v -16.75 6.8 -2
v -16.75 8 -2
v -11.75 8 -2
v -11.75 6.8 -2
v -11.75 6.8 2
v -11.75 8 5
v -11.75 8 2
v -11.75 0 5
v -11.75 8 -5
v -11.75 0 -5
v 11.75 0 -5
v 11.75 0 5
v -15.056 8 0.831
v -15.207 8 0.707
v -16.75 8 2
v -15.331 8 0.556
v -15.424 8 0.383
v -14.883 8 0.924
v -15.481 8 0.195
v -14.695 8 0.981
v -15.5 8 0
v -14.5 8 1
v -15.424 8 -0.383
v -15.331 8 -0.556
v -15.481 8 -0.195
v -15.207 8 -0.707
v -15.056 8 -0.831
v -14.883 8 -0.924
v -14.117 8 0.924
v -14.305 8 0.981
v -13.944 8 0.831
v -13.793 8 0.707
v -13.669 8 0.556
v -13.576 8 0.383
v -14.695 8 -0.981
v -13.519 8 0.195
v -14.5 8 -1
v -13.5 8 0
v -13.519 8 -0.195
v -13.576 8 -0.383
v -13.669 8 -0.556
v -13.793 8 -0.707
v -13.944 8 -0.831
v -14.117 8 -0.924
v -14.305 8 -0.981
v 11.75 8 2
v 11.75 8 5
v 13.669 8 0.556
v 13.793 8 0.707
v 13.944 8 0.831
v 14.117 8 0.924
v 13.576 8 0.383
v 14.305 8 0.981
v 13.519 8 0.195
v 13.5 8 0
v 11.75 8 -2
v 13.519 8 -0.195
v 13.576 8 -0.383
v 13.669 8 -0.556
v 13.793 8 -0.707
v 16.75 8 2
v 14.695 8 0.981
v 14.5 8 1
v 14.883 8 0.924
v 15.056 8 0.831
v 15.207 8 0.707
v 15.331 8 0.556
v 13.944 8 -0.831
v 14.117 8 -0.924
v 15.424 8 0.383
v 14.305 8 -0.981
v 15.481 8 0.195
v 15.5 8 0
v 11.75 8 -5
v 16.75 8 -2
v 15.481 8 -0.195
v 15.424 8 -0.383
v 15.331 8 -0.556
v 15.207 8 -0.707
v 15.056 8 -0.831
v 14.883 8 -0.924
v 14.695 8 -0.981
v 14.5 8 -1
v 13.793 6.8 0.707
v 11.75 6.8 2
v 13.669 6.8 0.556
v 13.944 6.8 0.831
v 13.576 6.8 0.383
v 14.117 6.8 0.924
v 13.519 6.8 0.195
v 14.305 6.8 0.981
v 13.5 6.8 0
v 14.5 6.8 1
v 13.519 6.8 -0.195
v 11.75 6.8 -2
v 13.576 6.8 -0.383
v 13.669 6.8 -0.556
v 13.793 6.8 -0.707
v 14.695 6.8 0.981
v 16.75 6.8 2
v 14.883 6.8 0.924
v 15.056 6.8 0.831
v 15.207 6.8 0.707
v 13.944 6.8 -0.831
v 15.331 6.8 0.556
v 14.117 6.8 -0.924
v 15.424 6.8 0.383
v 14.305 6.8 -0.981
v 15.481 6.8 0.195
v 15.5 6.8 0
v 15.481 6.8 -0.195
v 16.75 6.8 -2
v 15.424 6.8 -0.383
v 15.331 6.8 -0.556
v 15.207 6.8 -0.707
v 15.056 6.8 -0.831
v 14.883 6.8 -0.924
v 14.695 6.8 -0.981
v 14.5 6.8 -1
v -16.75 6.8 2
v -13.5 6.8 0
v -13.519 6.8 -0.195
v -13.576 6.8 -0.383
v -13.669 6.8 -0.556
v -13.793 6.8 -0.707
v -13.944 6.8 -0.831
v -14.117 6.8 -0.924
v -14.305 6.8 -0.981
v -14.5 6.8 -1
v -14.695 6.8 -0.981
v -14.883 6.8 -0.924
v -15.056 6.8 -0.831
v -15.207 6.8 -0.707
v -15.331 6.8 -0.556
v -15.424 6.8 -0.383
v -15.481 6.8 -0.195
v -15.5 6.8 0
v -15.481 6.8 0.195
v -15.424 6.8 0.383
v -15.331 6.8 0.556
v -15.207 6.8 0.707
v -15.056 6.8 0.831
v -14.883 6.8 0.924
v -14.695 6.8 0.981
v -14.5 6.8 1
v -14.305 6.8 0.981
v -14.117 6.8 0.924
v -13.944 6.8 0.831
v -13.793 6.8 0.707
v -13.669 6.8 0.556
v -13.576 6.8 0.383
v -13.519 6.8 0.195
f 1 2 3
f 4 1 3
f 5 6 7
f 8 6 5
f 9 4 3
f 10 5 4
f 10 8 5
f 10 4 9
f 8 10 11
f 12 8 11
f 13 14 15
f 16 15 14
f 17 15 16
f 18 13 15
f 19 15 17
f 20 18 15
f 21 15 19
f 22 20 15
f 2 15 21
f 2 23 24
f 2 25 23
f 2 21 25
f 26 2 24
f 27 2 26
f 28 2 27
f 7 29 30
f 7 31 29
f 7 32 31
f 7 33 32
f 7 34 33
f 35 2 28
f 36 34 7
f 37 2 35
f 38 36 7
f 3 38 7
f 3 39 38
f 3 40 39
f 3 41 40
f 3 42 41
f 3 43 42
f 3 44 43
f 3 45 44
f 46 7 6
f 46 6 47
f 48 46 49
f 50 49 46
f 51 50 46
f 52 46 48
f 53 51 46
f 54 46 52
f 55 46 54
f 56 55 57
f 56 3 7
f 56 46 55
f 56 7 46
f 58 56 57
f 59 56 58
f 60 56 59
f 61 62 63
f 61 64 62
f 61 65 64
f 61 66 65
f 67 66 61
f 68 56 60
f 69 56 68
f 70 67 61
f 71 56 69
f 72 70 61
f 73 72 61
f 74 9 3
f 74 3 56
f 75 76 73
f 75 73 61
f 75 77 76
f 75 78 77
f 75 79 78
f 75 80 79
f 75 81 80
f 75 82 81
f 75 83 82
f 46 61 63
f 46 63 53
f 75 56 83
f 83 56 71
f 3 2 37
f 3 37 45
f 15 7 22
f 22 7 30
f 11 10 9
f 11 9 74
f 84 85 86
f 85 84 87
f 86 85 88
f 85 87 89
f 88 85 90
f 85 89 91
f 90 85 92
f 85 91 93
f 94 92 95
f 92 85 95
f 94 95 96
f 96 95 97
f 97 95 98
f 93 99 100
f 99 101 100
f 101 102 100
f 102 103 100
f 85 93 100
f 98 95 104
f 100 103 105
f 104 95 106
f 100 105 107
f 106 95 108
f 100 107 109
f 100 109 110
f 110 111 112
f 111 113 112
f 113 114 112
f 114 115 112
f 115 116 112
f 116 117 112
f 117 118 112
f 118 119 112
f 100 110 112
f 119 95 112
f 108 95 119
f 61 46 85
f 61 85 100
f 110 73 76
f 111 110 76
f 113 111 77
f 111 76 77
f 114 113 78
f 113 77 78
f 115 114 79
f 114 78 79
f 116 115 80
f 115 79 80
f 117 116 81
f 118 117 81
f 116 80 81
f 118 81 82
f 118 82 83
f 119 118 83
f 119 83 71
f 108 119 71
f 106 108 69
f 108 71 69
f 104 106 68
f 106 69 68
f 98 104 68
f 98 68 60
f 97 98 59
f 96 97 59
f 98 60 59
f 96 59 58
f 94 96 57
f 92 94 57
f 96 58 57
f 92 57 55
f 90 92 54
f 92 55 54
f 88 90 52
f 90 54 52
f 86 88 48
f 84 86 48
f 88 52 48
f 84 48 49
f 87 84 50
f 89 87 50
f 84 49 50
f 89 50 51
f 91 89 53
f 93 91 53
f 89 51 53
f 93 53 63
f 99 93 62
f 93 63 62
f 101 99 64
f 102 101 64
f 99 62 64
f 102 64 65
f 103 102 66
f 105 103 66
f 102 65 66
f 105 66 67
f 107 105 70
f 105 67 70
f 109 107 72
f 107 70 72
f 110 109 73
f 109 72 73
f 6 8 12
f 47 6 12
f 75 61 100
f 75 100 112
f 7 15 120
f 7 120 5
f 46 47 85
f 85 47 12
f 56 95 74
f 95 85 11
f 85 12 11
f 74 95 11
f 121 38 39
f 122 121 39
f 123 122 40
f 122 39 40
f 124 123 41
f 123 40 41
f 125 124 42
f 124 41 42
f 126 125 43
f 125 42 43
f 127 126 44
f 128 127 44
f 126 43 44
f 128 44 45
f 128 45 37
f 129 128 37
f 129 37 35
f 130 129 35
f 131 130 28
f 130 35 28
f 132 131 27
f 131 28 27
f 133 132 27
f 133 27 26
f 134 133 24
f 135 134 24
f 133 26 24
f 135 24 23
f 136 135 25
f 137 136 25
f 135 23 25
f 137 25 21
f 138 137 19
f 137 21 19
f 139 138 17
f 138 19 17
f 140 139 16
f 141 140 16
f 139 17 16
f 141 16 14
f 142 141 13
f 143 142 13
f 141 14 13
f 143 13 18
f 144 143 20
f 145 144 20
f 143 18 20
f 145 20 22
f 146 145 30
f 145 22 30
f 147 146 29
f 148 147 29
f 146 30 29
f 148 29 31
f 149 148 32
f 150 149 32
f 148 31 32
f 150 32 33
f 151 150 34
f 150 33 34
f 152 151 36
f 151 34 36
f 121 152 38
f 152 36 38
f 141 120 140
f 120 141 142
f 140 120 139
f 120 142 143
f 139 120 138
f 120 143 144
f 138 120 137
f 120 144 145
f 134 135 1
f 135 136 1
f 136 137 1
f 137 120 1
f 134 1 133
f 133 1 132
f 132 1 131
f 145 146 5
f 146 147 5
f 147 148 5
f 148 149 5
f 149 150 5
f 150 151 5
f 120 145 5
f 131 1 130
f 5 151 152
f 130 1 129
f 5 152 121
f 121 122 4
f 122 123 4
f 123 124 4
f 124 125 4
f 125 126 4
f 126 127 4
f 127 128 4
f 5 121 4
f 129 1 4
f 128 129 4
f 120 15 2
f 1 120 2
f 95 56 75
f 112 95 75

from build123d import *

# Parameters (mm, degrees)
SKETCH1_W           = 23.5
SKETCH1_H           = 10
BOSS_EXTRUDE1_DEPTH = 8
SKETCH2_W           = 10
SKETCH2_H           = 4
SKETCH2_R           = 1
BOSS_EXTRUDE2_DEPTH = 1.2


with BuildPart() as part:
    # Sketch1 → Boss-Extrude1 (new body)
    with BuildSketch(Plane(origin=(0, 0, 0), x_dir=(1, 0, 0), z_dir=(0, 1, 0))):
        Rectangle(SKETCH1_W, SKETCH1_H)
    extrude(amount=BOSS_EXTRUDE1_DEPTH)

    # Sketch2 → Boss-Extrude2 (add)
    with BuildSketch(Plane(origin=(0, 8, 0), x_dir=(1, 0, 0), z_dir=(0, 1, 0))):
        with Locations((11.75, 0)):
            Rectangle(SKETCH2_W, SKETCH2_H)
        with Locations((14.5, 0)):
            Circle(SKETCH2_R, mode=Mode.SUBTRACT)
        with Locations((-11.75, 0)):
            Rectangle(SKETCH2_W, SKETCH2_H)
        with Locations((-14.5, 0)):
            Circle(SKETCH2_R, mode=Mode.SUBTRACT)
    extrude(amount=-BOSS_EXTRUDE2_DEPTH)


solid = part.part
